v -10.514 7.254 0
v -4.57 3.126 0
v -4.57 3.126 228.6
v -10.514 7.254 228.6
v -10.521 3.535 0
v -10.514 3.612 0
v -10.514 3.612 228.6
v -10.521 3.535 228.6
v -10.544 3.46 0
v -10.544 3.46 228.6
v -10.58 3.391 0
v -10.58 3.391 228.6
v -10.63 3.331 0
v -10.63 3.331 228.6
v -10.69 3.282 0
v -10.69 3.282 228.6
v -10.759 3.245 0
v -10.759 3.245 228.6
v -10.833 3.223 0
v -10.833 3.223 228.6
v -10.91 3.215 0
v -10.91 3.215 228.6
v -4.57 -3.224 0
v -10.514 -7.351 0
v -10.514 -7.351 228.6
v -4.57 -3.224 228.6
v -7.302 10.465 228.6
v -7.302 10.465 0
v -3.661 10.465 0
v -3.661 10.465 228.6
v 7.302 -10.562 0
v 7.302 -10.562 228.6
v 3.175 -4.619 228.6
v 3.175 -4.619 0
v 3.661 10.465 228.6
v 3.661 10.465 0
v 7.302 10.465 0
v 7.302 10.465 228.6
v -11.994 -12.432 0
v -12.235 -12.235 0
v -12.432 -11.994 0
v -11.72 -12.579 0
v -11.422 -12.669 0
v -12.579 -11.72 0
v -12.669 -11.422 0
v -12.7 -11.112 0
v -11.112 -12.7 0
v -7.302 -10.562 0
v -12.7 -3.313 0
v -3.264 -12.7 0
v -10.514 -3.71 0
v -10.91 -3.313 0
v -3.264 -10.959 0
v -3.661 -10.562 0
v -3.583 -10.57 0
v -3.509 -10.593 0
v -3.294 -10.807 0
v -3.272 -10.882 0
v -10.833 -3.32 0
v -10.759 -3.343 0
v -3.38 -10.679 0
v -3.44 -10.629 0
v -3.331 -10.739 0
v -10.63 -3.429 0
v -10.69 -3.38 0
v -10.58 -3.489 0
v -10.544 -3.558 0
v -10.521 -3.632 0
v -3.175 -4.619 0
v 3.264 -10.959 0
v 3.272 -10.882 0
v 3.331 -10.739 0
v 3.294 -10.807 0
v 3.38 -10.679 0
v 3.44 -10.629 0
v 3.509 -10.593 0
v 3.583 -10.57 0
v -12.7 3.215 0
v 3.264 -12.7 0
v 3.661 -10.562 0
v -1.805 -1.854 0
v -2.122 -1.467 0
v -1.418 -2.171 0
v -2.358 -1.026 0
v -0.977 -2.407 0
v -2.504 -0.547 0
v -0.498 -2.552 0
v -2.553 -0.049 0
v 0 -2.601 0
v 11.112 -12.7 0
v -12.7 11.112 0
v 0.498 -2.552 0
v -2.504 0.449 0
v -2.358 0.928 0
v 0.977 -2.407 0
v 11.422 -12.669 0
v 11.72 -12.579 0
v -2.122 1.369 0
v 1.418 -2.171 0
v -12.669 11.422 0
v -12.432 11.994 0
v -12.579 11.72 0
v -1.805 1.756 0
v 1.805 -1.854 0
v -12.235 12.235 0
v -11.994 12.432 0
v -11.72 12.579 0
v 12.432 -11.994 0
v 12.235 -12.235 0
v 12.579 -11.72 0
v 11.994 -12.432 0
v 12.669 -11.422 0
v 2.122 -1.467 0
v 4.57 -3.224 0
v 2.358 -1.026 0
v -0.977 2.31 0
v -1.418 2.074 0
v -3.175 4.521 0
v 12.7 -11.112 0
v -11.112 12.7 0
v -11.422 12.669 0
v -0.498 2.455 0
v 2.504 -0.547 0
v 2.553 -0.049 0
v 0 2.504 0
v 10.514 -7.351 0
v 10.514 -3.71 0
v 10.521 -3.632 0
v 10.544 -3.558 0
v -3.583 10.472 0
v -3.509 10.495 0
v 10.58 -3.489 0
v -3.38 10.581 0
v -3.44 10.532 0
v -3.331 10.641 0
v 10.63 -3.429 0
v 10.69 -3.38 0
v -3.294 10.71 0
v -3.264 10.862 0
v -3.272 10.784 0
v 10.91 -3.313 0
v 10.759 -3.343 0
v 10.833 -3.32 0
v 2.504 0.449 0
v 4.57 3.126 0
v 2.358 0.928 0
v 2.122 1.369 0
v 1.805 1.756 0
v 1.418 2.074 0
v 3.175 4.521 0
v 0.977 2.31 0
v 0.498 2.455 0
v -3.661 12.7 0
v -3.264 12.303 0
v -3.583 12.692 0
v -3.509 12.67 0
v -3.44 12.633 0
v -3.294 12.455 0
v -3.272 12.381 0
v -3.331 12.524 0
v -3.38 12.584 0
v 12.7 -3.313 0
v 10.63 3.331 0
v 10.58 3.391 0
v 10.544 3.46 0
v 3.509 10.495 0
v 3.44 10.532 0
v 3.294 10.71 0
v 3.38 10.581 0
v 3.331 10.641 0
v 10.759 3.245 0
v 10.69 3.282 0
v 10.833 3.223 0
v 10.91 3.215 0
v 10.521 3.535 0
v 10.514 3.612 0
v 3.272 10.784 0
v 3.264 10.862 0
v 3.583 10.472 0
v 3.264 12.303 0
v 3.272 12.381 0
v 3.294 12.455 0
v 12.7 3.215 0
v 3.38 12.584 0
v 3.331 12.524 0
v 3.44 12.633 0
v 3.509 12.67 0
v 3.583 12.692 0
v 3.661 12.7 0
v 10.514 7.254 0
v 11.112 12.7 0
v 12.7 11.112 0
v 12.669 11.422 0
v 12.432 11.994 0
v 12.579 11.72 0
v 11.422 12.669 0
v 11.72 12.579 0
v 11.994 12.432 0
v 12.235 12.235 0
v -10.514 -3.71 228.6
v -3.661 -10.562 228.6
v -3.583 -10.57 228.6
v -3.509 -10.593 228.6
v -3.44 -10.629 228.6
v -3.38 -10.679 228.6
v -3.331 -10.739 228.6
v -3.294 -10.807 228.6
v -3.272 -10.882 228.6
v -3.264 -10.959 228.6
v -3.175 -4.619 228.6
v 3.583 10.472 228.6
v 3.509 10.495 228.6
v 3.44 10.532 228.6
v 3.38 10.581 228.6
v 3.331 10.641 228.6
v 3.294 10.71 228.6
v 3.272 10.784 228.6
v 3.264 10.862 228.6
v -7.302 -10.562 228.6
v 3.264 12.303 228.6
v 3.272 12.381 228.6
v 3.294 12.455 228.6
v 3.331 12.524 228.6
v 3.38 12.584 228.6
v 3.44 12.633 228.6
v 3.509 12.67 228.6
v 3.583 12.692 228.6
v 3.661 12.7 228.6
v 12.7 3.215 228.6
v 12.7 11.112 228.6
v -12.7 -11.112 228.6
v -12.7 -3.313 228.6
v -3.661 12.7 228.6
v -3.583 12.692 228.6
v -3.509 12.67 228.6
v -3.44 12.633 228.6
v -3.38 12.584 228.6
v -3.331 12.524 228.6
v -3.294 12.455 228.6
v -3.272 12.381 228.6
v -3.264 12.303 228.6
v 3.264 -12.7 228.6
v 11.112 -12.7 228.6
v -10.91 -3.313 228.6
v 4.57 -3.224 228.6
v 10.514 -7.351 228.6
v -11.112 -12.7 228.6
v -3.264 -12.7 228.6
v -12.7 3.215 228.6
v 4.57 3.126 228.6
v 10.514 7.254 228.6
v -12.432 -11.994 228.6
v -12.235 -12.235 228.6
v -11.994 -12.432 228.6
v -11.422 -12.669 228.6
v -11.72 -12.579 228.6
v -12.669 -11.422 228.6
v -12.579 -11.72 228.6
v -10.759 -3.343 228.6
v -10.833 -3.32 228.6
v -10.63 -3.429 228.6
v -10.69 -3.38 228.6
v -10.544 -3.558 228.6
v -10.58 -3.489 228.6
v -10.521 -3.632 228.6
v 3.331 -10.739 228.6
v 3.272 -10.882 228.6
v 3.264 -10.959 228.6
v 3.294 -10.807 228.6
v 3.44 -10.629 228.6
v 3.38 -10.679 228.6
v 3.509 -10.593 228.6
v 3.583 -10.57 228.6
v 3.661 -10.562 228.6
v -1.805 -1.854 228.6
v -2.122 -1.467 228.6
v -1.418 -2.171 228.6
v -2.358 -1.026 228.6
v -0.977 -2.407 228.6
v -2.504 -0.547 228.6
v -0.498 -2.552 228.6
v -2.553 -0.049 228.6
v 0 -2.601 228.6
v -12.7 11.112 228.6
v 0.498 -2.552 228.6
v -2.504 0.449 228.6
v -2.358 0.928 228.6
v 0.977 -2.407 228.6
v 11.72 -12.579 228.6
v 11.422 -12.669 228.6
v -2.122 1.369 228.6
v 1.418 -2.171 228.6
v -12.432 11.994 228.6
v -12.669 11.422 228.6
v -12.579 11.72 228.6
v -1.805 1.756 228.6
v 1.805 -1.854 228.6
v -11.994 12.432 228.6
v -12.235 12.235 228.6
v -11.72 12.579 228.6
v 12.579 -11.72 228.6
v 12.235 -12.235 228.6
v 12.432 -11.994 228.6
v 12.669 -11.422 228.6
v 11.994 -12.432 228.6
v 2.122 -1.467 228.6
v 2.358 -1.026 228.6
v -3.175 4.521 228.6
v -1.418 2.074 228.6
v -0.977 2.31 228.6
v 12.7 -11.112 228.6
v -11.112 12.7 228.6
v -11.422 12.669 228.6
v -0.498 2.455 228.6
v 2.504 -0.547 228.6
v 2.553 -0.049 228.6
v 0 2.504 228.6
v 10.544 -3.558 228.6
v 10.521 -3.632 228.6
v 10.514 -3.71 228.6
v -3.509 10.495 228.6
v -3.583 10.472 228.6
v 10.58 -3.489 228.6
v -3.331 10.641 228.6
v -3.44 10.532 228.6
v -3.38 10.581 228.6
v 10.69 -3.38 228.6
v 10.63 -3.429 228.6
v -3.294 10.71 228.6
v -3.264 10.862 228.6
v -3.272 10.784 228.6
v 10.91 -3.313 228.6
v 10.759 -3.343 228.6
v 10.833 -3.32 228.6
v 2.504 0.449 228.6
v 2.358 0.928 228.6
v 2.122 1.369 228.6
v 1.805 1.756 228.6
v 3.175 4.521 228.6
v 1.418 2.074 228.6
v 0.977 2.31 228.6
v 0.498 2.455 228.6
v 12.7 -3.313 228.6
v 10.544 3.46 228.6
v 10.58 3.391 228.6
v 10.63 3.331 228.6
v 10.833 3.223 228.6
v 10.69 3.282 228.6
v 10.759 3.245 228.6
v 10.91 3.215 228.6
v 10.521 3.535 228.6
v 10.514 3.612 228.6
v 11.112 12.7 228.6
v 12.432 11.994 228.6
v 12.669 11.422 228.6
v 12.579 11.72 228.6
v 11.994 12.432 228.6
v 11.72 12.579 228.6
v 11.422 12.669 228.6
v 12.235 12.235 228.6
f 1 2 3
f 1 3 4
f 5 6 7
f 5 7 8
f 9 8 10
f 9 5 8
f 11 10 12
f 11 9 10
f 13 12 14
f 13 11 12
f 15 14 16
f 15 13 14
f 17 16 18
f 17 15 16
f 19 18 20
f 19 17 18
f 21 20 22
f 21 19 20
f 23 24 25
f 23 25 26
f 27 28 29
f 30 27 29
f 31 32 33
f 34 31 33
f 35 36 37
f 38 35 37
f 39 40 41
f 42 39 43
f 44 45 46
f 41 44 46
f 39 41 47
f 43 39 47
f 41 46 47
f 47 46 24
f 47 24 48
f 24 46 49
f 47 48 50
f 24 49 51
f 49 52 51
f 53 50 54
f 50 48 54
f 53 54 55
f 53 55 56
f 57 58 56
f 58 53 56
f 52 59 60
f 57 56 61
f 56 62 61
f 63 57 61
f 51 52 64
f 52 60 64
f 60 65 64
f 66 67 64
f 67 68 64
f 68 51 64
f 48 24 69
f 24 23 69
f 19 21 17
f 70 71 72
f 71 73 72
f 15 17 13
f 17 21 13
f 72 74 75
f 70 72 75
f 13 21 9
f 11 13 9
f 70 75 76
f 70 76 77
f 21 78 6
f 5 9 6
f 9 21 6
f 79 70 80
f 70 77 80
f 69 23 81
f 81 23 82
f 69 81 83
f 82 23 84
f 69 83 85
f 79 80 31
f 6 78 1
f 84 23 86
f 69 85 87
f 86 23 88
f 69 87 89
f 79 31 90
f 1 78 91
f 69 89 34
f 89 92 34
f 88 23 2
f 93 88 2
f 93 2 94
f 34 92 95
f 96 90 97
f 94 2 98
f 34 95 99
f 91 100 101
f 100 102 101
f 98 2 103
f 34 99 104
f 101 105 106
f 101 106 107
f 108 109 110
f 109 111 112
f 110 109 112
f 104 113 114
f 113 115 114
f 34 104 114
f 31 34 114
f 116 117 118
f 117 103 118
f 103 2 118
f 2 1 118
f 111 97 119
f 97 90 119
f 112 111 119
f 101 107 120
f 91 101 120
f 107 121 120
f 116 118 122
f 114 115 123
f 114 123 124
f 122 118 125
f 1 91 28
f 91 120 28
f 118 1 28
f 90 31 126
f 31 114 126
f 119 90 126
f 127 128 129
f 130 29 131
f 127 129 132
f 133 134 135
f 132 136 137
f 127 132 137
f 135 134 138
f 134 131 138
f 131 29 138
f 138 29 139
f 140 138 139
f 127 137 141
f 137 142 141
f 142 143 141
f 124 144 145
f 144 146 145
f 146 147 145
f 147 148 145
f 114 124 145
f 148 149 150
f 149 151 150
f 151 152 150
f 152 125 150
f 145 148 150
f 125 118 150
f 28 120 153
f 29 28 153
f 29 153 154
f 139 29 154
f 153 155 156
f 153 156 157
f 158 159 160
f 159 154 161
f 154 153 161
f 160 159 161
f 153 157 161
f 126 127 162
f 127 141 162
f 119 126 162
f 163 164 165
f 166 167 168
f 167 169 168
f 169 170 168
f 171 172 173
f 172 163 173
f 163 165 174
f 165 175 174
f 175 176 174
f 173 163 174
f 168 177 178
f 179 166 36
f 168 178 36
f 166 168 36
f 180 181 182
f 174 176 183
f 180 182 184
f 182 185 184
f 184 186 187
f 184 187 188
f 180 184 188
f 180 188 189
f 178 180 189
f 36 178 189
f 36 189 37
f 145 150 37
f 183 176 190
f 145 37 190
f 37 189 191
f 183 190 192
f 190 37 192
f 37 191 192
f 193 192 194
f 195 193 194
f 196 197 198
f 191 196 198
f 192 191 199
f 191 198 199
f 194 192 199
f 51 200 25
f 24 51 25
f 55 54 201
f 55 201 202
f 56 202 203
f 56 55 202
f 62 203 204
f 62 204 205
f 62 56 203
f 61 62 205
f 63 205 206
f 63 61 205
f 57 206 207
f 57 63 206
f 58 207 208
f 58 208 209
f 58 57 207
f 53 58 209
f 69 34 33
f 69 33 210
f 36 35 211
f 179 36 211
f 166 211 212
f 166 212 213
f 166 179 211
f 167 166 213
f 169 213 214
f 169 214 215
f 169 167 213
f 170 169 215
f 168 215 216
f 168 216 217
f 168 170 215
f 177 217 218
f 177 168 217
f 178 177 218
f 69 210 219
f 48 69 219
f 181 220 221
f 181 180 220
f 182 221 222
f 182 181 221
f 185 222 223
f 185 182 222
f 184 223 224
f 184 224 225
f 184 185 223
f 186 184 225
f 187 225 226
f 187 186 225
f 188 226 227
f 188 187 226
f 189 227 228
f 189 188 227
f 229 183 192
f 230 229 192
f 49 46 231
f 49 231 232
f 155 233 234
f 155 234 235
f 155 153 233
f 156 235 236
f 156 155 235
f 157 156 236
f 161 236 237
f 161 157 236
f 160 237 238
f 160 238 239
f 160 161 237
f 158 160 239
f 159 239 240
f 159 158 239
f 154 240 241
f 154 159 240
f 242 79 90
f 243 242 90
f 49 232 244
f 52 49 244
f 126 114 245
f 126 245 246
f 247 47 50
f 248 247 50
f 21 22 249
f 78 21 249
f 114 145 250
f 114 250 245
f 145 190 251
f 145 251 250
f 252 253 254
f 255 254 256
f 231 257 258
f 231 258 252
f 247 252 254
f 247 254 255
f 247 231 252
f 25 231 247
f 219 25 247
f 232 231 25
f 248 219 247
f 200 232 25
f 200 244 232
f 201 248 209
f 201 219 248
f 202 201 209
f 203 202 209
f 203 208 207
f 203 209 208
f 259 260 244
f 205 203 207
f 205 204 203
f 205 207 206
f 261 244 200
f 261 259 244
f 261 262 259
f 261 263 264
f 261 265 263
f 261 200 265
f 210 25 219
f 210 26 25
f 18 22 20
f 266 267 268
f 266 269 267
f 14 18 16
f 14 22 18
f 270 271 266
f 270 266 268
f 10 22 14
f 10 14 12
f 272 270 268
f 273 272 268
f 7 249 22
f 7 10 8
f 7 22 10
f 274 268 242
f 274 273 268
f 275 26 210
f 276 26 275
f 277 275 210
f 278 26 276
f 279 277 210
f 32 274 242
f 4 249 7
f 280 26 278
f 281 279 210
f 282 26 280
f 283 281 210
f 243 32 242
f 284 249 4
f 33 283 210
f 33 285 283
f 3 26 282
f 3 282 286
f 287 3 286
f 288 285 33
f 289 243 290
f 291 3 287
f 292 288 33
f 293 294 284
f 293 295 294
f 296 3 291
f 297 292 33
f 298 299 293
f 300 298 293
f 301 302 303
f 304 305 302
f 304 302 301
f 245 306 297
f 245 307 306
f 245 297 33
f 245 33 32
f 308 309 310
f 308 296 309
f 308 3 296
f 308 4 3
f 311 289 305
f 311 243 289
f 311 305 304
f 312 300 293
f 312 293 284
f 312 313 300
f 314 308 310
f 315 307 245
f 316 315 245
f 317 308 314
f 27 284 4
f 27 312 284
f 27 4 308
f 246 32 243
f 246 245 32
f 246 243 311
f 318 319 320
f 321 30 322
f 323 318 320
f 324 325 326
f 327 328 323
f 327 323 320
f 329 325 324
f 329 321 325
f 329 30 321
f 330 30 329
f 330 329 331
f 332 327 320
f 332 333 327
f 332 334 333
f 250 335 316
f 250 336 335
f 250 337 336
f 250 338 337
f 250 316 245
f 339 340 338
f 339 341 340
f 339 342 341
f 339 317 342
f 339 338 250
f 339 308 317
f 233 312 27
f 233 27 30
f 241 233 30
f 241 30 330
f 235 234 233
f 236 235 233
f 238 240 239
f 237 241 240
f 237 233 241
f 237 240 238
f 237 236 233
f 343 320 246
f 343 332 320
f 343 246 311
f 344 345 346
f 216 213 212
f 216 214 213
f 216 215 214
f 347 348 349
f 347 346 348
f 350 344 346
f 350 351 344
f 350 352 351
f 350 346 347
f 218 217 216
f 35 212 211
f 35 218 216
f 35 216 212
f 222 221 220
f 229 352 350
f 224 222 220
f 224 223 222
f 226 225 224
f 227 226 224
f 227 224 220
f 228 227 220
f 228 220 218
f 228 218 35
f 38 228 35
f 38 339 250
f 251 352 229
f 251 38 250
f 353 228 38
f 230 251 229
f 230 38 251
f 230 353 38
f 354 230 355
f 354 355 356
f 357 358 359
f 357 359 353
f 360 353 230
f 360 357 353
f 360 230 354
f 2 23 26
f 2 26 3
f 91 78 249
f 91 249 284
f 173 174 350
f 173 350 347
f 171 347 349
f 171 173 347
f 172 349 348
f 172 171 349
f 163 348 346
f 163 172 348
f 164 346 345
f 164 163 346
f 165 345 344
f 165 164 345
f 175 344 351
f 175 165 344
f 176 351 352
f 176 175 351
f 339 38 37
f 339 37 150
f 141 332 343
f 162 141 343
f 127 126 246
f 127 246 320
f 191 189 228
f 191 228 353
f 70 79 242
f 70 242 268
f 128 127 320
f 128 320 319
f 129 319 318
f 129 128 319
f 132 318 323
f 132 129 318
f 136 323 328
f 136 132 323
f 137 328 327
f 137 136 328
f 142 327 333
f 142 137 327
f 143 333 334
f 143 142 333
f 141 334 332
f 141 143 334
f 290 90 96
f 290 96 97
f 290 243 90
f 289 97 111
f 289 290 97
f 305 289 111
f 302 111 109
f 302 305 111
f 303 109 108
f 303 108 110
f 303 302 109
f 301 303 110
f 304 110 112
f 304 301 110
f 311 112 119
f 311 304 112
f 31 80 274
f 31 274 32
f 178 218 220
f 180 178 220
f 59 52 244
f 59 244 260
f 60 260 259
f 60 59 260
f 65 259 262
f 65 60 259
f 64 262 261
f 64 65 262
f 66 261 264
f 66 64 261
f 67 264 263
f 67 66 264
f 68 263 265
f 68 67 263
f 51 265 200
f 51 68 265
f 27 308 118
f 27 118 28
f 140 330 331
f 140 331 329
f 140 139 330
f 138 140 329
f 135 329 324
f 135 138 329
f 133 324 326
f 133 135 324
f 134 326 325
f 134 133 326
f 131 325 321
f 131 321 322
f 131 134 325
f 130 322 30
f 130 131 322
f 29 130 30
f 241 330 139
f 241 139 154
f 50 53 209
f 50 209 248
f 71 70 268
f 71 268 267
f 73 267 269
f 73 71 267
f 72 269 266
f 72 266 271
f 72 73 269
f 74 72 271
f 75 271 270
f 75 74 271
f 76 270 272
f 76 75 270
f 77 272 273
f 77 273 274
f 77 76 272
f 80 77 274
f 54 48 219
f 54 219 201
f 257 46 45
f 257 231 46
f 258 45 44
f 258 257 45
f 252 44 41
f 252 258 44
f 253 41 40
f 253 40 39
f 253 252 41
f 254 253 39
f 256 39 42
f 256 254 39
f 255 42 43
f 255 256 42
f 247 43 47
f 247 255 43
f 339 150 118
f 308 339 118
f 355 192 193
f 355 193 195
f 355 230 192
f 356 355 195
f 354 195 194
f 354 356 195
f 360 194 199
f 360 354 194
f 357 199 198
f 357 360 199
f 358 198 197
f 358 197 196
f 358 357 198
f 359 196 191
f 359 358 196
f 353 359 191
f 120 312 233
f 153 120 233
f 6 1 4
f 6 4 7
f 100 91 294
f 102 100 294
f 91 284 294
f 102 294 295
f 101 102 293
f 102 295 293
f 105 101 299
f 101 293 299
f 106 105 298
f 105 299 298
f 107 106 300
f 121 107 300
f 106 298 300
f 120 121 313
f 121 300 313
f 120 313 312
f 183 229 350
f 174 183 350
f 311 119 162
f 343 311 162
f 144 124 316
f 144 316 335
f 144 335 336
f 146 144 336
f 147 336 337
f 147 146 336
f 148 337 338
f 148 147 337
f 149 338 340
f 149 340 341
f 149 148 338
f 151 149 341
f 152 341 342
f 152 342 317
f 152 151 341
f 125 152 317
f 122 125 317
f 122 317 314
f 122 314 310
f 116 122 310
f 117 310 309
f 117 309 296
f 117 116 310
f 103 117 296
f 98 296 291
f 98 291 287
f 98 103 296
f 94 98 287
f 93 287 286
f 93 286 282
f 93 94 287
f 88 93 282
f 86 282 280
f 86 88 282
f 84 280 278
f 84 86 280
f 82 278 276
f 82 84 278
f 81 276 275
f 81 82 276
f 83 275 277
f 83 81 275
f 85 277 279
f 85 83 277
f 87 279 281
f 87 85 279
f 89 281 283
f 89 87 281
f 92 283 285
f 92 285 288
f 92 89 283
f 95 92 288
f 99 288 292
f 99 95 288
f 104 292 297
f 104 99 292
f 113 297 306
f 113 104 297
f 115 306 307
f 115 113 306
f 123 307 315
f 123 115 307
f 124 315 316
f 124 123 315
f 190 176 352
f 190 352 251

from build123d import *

# Parameters (mm, degrees)
SKETCH1_W           = 25.4
SKETCH1_H           = 25.4
BOSS_EXTRUDE1_DEPTH = 228.6
FILLET1_R           = 1.5875
HOLE1_OUTLINE_R     = 2.5527
HOLE1_DEPTH         = 228.6
SKETCH7_W           = 6.5278
SKETCH7_H           = 2.2352
CUT_EXTRUDE2_DEPTH  = 228.6
FILLET4_R           = 0.396875
CIRPATTERN2_DEPTH   = 228.6


# Read off the part's stored shape, not the designer's step: Hole1, CirPattern2
with BuildPart() as part:
    # Sketch1 → Boss-Extrude1 (new body)
    with BuildSketch(Plane.XY):
        Rectangle(SKETCH1_W, SKETCH1_H)
    extrude(amount=BOSS_EXTRUDE1_DEPTH)

    # Fillet1
    fillet1_edges = [part.edges().sort_by_distance(p)[0] for p in [
        (12.7, -12.7, 114.3),
        (-12.7, -12.7, 114.3),
        (-12.7, 12.7, 114.3),
        (12.7, 12.7, 114.3),
    ]]
    fillet(fillet1_edges, radius=FILLET1_R)

    # Hole1 outline → Hole1 (cut)
    with BuildSketch(Plane.XY):
        with Locations((0, -0.048792482)):
            Circle(HOLE1_OUTLINE_R)
    extrude(amount=HOLE1_DEPTH, mode=Mode.SUBTRACT)

    # Sketch7 → Cut-Extrude2 (cut)
    with BuildSketch(Plane.XY.offset(228.6)):
        with Locations((0, 11.5824)):
            Rectangle(SKETCH7_W, SKETCH7_H)
        Polygon((-3.175, 4.5212), (-7.3025, 10.4648), (7.3025, 10.4648), (3.175, 4.5212), align=None)
    extrude(amount=-CUT_EXTRUDE2_DEPTH, mode=Mode.SUBTRACT)

    # Fillet4
    fillet4_edges = [part.edges().sort_by_distance(p)[0] for p in [
        (-3.2639, 10.4648, 114.3),
        (-3.2639, 12.7, 114.3),
        (3.2639, 12.7, 114.3),
        (3.2639, 10.4648, 114.3),
    ]]
    fillet(fillet4_edges, radius=FILLET4_R)

    # CirPattern2 outline → CirPattern2 (cut)
    with BuildSketch(Plane.XY):
        with BuildLine():
            ThreePointArc((-3.660775, -10.562384964), (-3.380141996, -10.67862696), (-3.2639, -10.959259964))
            Line((-3.2639, -10.959259964), (-3.2639, -12.7))
            Line((-3.2639, -12.7), (3.2639, -12.7))
            Line((3.2639, -12.7), (3.2639, -10.959259964))
            ThreePointArc((3.2639, -10.959259964), (3.380141996, -10.67862696), (3.660775, -10.562384964))
            Line((3.660775, -10.562384964), (7.3025, -10.562384964))
            Line((7.3025, -10.562384964), (3.175, -4.618784964))
            Line((3.175, -4.618784964), (-3.175, -4.618784964))
            Line((-3.175, -4.618784964), (-7.3025, -10.562384964))
            Line((-7.3025, -10.562384964), (-3.660775, -10.562384964))
        make_face()
        with BuildLine():
            Line((-12.7, -3.312692482), (-10.910467482, -3.312692482))
            ThreePointArc((-10.910467482, -3.312692482), (-10.629834478, -3.428934478), (-10.513592482, -3.709567482))
            Line((-10.513592482, -3.709567482), (-10.513592482, -7.351292482))
            Line((-10.513592482, -7.351292482), (-4.569992482, -3.223792482))
            Line((-4.569992482, -3.223792482), (-4.569992482, 3.126207518))
            Line((-4.569992482, 3.126207518), (-10.513592482, 7.253707518))
            Line((-10.513592482, 7.253707518), (-10.513592482, 3.611982518))
            ThreePointArc((-10.513592482, 3.611982518), (-10.629834478, 3.331349514), (-10.910467482, 3.215107518))
            Line((-10.910467482, 3.215107518), (-12.7, 3.215107518))
            Line((-12.7, 3.215107518), (-12.7, -3.312692482))
        make_face()
        with BuildLine():
            ThreePointArc((10.513592482, -3.709567482), (10.629834478, -3.428934478), (10.910467482, -3.312692482))
            Line((10.910467482, -3.312692482), (12.7, -3.312692482))
            Line((12.7, -3.312692482), (12.7, 3.215107518))
            Line((12.7, 3.215107518), (10.910467482, 3.215107518))
            ThreePointArc((10.910467482, 3.215107518), (10.629834478, 3.331349514), (10.513592482, 3.611982518))
            Line((10.513592482, 3.611982518), (10.513592482, 7.253707518))
            Line((10.513592482, 7.253707518), (4.569992482, 3.126207518))
            Line((4.569992482, 3.126207518), (4.569992482, -3.223792482))
            Line((4.569992482, -3.223792482), (10.513592482, -7.351292482))
            Line((10.513592482, -7.351292482), (10.513592482, -3.709567482))
        make_face()
    extrude(amount=CIRPATTERN2_DEPTH, mode=Mode.SUBTRACT)


solid = part.part
